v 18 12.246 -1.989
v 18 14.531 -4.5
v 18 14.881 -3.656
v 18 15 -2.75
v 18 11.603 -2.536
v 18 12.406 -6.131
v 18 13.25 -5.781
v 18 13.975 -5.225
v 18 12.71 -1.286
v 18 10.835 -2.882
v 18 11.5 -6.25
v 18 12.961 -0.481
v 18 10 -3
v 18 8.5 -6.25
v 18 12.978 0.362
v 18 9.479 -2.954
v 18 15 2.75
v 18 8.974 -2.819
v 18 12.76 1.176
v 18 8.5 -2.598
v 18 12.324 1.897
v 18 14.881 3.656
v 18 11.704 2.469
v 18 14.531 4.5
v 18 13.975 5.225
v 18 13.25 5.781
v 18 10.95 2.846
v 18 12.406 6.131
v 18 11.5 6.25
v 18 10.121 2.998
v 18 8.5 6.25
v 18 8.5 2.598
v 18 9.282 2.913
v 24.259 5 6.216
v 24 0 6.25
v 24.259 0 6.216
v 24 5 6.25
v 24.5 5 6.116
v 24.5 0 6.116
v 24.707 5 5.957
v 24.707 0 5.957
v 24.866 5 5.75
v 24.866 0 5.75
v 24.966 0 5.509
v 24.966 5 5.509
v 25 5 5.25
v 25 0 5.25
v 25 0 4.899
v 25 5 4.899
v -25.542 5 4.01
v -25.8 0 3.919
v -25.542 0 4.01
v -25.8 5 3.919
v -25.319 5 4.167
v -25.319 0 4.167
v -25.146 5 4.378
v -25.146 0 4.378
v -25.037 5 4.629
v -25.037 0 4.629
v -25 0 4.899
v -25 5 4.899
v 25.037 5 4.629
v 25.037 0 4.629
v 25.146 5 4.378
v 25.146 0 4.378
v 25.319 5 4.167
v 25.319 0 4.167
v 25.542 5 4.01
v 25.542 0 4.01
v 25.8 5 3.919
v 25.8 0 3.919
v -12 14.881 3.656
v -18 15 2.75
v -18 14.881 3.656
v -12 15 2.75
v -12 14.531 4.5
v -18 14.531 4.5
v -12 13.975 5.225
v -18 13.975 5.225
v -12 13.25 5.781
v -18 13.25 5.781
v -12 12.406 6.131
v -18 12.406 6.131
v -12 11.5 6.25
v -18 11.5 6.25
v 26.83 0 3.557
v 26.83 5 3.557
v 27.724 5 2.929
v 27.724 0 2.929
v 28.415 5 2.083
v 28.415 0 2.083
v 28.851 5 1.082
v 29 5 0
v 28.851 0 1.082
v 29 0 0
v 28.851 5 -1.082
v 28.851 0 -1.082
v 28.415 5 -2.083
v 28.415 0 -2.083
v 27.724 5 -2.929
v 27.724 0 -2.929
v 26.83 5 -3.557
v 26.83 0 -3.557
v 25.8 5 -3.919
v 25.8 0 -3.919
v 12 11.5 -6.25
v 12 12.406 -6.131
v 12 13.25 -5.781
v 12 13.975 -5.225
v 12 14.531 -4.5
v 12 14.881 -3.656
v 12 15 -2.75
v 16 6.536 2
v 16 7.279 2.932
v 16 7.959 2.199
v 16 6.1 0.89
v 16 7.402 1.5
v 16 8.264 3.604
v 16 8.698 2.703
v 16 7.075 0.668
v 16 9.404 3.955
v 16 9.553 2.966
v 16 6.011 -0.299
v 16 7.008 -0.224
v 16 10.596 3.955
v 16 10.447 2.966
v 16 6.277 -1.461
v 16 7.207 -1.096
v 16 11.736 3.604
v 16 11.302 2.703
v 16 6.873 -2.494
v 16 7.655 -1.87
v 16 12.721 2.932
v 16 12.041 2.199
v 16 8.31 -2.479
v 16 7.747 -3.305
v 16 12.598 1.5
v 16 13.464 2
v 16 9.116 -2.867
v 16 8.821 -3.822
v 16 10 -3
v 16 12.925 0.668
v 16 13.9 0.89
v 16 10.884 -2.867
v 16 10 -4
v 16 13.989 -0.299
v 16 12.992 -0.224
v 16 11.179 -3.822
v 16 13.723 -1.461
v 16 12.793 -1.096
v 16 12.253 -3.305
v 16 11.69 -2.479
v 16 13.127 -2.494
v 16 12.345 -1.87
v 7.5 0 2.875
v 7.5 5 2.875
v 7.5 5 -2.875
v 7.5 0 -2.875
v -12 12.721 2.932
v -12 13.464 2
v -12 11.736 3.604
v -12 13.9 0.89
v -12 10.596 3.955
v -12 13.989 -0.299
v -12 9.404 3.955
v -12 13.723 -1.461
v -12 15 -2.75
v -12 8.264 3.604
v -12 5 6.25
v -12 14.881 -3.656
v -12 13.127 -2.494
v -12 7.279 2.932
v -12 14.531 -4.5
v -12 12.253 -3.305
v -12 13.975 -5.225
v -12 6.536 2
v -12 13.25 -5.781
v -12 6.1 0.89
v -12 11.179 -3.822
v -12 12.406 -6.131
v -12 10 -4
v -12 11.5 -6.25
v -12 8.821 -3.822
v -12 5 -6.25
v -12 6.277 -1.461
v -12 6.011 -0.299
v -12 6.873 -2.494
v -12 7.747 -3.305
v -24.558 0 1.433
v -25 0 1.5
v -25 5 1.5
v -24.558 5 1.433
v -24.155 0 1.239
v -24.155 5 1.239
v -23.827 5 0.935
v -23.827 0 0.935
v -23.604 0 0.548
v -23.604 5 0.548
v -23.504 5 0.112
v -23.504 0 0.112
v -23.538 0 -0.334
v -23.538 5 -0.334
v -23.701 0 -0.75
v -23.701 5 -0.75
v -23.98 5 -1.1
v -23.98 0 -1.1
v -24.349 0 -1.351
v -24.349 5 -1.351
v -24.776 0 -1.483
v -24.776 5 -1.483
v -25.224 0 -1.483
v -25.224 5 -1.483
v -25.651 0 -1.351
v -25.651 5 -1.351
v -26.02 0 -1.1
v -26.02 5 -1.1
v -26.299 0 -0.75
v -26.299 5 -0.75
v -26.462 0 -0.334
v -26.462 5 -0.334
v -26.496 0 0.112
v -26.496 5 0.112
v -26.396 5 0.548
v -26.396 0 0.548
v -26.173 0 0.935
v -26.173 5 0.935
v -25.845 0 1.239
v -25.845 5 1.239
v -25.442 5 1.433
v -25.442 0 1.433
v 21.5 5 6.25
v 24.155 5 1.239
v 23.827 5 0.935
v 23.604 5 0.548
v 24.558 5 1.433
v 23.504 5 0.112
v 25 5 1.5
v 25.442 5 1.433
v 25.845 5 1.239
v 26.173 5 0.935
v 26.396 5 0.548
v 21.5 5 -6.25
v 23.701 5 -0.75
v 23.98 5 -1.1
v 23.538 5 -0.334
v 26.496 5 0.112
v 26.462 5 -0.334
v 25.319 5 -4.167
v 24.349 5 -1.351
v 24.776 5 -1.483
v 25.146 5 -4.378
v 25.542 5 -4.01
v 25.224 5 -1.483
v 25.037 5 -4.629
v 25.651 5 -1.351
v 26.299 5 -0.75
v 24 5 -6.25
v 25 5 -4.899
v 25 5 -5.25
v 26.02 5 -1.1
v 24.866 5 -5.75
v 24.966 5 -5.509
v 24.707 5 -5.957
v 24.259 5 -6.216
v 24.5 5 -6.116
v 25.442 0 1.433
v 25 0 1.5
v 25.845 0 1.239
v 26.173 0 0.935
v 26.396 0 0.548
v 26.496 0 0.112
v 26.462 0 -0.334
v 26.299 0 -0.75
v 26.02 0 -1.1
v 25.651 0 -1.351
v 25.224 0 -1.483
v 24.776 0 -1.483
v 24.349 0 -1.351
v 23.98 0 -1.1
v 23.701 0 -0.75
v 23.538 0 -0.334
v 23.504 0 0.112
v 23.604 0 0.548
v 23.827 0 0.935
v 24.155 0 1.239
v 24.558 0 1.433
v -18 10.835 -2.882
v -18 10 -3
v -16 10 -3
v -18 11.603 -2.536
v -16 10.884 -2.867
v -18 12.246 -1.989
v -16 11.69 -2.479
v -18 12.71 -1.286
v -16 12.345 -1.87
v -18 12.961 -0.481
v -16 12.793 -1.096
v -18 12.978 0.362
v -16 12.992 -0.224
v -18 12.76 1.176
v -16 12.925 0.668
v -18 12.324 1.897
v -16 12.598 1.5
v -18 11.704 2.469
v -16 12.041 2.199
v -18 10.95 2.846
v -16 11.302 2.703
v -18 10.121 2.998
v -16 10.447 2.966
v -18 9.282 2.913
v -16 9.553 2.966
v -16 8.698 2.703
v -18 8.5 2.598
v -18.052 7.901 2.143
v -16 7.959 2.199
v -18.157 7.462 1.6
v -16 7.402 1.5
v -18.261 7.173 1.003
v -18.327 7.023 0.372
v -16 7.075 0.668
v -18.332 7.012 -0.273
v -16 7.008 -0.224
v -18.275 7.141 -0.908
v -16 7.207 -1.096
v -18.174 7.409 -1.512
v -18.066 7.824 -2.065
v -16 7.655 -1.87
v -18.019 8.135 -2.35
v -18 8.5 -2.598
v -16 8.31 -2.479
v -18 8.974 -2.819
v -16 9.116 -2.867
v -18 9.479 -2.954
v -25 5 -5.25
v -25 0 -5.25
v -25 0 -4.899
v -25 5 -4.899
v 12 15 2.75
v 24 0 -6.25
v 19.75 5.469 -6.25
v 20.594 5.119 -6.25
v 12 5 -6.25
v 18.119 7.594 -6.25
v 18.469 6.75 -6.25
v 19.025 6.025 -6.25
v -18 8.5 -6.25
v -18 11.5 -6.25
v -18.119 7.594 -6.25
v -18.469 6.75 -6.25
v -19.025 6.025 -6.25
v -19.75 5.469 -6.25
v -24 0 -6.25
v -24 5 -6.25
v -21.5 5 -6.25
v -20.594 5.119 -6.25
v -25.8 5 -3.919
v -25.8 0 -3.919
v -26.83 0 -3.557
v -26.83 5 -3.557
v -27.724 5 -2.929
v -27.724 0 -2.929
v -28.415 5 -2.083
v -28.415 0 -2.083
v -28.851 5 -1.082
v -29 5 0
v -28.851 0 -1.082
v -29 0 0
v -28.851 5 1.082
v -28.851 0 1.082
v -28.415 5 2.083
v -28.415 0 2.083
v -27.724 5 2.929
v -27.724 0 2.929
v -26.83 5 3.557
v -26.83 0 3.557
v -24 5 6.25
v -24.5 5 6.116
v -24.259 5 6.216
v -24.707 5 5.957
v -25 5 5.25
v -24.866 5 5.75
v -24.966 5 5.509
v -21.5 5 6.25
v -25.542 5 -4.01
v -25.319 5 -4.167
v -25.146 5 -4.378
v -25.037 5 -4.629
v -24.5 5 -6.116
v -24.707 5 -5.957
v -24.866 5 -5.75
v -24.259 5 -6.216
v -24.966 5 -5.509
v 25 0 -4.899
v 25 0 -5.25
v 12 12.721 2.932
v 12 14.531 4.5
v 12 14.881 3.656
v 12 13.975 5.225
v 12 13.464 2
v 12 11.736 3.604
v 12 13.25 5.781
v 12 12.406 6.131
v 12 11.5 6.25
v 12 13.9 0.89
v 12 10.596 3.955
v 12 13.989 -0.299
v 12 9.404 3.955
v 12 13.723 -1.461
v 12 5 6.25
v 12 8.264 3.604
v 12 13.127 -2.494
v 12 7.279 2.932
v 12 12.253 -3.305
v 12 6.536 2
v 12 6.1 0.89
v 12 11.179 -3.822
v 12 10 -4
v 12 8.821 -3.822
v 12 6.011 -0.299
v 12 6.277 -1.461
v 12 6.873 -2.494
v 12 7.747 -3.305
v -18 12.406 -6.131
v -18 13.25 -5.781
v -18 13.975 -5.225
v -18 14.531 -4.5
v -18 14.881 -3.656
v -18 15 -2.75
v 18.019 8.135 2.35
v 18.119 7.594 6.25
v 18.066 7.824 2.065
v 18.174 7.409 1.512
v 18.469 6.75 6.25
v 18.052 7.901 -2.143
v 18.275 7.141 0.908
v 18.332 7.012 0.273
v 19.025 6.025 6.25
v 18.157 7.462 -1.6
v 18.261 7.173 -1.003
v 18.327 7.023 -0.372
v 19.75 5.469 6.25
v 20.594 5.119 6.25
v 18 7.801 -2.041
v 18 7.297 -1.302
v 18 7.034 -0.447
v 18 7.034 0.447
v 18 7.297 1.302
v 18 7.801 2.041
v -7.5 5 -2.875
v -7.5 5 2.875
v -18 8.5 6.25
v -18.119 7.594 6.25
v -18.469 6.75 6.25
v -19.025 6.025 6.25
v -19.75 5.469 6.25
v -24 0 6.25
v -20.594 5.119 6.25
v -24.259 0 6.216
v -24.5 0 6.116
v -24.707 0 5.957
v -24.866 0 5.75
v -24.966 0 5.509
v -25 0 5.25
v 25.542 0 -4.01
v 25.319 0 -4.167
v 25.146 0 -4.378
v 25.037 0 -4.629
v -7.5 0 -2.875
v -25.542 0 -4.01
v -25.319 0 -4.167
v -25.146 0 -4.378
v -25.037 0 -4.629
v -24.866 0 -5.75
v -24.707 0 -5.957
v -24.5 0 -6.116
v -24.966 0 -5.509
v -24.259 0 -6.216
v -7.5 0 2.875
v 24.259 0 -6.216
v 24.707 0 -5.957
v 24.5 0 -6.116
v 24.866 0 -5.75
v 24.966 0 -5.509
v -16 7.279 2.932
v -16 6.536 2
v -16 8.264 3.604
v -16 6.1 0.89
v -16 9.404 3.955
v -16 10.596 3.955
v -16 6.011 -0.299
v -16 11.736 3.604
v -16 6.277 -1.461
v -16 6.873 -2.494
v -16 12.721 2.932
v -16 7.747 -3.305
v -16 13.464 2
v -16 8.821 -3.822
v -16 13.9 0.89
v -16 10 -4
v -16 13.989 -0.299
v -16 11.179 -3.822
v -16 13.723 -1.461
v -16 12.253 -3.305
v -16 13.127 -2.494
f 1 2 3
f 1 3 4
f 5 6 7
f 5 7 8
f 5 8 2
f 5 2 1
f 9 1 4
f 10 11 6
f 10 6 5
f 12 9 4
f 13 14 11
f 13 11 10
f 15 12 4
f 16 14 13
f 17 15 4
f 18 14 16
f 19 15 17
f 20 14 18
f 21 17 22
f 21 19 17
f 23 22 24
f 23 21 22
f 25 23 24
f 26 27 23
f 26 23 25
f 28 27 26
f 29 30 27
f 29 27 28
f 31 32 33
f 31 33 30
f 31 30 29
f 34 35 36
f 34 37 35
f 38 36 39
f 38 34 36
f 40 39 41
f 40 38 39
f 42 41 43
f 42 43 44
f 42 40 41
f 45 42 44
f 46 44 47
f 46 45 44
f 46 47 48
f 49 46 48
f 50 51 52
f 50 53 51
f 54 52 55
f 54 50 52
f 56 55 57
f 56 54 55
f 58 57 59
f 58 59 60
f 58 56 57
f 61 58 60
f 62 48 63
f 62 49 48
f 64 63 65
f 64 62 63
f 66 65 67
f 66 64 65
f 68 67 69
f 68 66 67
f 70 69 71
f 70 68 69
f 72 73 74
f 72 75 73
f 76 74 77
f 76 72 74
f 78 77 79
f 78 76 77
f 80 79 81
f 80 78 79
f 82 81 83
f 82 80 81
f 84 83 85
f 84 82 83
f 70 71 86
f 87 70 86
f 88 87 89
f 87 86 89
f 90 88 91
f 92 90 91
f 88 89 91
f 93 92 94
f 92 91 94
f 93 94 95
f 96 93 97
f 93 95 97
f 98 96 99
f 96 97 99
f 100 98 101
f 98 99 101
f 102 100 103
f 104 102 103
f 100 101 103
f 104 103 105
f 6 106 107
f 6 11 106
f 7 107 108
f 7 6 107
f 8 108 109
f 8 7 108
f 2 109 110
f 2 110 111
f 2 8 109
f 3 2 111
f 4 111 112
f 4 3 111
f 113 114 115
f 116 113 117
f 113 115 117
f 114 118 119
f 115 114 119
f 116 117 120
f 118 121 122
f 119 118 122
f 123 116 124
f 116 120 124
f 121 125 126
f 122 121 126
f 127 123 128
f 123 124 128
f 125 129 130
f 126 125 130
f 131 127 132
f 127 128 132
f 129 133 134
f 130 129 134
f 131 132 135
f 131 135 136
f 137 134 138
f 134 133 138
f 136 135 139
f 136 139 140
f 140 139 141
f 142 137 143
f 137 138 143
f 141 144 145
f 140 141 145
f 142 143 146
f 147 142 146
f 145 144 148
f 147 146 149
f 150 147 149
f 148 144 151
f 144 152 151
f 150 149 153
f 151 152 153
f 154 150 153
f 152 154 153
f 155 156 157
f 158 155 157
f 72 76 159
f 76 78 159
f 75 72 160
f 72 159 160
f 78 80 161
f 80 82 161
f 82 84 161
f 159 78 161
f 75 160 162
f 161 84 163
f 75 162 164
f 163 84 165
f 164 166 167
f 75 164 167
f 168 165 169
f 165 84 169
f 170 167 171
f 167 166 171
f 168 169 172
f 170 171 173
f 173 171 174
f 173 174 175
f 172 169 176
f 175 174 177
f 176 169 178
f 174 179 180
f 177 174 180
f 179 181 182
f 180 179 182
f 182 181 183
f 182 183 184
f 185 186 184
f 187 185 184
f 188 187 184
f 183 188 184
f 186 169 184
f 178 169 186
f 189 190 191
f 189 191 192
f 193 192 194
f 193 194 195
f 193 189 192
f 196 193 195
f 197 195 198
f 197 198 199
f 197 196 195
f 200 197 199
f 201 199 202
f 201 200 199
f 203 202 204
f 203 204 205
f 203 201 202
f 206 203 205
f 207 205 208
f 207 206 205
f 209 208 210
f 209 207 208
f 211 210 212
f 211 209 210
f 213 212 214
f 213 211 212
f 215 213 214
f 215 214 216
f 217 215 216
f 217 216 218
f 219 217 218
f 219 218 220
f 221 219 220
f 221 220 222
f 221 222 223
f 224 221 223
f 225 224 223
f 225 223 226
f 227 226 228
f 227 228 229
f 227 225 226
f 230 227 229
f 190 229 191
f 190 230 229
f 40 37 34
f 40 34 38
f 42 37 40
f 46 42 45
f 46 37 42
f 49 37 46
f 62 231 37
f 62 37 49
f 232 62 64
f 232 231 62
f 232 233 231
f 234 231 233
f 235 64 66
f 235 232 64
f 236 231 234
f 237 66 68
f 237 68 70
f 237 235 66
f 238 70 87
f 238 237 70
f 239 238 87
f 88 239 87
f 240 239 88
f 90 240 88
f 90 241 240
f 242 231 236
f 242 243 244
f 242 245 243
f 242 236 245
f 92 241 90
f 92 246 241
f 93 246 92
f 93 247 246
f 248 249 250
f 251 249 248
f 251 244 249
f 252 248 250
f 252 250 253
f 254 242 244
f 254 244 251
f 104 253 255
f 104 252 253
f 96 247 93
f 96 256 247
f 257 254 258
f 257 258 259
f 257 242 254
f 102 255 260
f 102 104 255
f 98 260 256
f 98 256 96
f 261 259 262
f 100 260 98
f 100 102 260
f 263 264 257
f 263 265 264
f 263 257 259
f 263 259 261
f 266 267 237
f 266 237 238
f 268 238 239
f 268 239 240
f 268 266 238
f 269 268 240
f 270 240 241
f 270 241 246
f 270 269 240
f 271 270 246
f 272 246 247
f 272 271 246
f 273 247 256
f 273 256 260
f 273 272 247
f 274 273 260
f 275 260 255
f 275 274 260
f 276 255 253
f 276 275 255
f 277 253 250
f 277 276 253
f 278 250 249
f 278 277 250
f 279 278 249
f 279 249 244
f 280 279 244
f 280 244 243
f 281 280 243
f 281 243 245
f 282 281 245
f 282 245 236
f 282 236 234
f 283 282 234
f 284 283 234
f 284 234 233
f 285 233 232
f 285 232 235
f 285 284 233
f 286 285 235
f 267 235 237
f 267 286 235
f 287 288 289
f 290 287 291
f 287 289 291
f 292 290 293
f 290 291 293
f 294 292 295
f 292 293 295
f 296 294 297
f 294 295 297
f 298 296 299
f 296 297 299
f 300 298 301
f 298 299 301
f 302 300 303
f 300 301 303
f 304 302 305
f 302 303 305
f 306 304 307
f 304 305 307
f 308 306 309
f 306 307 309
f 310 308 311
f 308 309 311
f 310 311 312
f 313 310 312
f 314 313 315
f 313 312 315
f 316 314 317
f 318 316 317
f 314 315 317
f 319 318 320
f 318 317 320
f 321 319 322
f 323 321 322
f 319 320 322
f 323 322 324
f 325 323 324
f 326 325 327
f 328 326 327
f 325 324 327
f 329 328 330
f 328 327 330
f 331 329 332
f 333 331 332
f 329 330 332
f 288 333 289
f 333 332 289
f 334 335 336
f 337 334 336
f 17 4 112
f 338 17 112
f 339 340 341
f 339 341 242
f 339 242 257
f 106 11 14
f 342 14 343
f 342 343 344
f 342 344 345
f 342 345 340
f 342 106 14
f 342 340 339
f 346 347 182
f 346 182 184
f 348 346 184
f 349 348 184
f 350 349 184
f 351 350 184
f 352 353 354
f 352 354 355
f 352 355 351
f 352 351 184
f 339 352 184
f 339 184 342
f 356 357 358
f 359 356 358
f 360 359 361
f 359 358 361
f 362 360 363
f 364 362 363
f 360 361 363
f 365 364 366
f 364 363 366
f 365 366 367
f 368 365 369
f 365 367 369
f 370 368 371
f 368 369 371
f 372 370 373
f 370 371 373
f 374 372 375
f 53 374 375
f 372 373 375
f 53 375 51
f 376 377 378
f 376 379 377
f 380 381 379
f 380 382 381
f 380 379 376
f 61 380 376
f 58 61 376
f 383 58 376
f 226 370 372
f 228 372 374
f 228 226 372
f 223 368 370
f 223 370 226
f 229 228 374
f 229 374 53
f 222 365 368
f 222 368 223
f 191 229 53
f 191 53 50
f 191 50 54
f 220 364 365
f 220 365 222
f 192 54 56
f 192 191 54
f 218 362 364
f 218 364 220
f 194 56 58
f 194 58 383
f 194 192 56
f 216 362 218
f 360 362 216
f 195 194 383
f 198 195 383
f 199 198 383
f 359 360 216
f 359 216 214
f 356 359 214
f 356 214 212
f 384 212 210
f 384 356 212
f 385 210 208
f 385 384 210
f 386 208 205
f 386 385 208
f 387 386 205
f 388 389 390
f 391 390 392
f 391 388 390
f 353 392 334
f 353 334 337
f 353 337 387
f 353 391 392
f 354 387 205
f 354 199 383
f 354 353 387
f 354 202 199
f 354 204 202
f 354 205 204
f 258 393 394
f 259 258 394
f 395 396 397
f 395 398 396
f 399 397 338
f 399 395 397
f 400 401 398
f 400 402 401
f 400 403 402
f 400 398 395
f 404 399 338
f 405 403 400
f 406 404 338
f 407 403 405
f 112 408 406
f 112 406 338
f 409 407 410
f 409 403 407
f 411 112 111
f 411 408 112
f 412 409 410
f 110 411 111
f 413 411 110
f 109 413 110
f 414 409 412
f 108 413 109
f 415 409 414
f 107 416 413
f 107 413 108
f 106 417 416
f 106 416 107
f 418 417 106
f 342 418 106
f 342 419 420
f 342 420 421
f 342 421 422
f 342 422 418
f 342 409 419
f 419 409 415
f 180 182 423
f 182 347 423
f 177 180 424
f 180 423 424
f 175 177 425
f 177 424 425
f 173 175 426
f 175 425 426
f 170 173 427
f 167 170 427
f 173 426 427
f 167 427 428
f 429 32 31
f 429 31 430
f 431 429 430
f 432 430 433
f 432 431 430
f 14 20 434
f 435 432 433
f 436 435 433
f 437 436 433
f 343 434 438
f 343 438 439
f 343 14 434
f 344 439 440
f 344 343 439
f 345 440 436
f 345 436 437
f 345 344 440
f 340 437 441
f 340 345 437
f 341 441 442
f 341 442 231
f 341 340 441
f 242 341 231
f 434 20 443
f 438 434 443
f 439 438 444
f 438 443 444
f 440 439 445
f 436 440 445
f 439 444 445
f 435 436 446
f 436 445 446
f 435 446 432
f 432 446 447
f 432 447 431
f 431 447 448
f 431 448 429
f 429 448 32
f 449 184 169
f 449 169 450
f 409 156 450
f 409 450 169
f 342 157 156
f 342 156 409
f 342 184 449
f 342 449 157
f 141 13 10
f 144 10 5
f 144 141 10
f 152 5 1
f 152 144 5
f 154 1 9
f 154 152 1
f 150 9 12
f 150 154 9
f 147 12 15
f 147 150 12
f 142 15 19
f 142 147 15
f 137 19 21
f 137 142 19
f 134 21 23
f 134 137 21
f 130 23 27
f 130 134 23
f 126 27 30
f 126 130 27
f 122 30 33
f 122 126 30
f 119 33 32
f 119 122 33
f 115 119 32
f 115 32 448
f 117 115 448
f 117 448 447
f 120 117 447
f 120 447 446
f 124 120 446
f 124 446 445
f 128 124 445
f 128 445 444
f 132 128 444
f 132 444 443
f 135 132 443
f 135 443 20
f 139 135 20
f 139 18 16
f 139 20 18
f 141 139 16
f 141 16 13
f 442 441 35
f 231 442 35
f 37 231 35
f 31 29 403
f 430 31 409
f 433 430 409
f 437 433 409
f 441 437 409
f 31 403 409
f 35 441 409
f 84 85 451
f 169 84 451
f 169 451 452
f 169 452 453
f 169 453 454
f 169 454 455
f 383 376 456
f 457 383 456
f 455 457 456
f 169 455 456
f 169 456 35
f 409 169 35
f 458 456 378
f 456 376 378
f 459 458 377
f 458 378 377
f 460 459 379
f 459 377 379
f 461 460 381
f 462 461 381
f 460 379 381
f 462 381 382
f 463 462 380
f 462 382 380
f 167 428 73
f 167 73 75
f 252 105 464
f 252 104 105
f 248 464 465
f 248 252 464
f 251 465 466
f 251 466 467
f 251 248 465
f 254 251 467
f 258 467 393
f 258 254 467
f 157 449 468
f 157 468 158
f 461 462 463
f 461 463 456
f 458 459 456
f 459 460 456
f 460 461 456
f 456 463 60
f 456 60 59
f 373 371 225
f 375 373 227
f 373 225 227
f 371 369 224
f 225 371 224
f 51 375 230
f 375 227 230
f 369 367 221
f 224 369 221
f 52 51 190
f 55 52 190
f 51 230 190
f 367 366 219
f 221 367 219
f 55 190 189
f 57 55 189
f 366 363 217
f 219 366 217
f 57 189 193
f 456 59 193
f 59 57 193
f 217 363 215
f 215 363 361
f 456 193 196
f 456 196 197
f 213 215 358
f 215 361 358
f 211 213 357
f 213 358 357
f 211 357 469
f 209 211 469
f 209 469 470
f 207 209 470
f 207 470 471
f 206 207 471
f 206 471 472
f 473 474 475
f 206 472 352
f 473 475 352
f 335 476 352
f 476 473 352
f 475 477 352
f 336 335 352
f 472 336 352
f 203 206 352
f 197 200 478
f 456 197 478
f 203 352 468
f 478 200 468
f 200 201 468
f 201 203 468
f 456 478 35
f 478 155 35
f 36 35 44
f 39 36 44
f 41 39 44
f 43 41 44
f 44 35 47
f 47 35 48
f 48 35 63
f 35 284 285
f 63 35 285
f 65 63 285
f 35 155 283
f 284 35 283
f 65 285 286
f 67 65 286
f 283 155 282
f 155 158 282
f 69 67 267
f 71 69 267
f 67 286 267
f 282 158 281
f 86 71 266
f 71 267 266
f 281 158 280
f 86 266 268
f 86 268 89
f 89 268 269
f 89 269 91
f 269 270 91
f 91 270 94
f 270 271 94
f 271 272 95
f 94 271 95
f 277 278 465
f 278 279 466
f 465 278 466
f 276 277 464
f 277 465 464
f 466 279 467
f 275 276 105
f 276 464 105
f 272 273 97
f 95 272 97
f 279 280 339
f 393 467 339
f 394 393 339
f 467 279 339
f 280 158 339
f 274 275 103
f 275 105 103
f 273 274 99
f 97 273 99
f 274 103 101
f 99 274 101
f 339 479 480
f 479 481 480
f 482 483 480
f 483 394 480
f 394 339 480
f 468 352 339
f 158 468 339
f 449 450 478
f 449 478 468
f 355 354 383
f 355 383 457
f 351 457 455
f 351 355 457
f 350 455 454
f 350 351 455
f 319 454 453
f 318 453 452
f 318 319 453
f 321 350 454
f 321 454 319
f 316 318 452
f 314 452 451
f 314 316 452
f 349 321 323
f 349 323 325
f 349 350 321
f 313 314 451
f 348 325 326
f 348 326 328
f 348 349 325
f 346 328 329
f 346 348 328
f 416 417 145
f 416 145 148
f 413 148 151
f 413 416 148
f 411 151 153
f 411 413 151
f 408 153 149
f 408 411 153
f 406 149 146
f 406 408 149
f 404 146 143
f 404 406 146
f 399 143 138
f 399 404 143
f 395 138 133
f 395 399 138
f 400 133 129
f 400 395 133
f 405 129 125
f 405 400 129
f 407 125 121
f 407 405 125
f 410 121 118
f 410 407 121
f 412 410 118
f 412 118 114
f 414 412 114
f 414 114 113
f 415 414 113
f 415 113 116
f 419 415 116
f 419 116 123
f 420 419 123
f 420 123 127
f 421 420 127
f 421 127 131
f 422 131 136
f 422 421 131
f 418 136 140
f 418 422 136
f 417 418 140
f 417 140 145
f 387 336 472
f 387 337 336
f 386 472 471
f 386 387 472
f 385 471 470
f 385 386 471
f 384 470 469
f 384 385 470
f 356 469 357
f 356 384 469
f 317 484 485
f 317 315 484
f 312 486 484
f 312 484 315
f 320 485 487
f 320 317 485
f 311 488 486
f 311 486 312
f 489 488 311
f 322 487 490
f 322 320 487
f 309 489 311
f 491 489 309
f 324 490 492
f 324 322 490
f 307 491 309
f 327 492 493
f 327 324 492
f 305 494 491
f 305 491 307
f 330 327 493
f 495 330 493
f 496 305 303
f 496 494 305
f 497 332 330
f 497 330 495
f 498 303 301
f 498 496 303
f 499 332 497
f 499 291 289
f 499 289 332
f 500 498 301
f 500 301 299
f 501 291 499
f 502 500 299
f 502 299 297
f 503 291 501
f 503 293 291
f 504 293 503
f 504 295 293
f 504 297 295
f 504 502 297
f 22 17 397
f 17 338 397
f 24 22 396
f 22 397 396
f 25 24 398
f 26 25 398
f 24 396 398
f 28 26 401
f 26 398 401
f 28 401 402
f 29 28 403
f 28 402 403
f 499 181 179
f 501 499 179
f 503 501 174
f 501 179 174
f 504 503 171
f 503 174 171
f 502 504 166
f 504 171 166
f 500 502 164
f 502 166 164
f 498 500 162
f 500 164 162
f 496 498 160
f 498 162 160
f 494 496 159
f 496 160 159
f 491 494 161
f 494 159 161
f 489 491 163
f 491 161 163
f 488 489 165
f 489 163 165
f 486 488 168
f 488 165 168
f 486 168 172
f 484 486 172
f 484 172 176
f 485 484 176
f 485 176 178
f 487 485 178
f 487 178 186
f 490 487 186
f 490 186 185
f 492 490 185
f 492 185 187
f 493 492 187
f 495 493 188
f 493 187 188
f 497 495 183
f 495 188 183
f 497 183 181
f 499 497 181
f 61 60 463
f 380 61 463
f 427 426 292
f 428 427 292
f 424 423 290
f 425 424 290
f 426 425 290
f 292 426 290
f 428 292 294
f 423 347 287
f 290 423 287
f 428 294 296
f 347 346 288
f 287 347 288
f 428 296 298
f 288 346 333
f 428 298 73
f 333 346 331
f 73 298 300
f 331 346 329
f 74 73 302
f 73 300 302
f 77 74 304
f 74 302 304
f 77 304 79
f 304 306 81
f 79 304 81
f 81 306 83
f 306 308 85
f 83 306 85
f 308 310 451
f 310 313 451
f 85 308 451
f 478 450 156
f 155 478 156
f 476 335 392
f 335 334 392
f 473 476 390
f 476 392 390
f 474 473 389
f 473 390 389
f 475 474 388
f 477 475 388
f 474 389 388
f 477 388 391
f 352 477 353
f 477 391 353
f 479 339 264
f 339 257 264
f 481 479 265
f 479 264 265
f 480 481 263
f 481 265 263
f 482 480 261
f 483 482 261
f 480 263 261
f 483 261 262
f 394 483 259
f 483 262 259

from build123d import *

# Parameters (mm, degrees)
SKETCH1_R           = 1.5
BOSS_EXTRUDE1_DEPTH = 5
BOSS_EXTRUDE2_DEPTH = 10
SKETCH3_R           = 4
CUT_EXTRUDE1_DEPTH  = 4
SKETCH3_3_R         = 3
CUT_EXTRUDE2_DEPTH  = 45.102862719
FILLET6_R           = 3.5
FILLET7_R           = 3.5
FILLET8_R           = 3.5
FILLET9_R           = 3.5
FILLET10_R          = 3.5
FILLET11_R          = 3.5
FILLET12_R          = 1
FILLET13_R          = 1
FILLET14_R          = 1
FILLET15_R          = 1
FILLET16_R          = 1
FILLET17_R          = 1
FILLET18_R          = 1
FILLET19_R          = 1
SKETCH4_W           = 15
SKETCH4_H           = 5.75
CUT_EXTRUDE3_DEPTH  = 32.305949934


with BuildPart() as part:
    # Sketch1 → Boss-Extrude1 (new body)
    with BuildSketch(Plane(origin=(0, 0, 0), x_dir=(1, 0, 0), z_dir=(0, 1, 0))):
        with BuildLine():
            Line((-25, -4), (-25, -6.25))
            Line((-25, -6.25), (25, -6.25))
            Line((25, -6.25), (25, -4))
            ThreePointArc((25, -4), (29, 0), (25, 4))
            Line((25, 4), (25, 6.25))
            Line((25, 6.25), (-25, 6.25))
            Line((-25, 6.25), (-25, 4))
            ThreePointArc((-25, 4), (-29, 0), (-25, -4))
        make_face()
        with Locations(Location((25, 0, 0), (0, 0, 270))):
            Circle(SKETCH1_R, mode=Mode.SUBTRACT)
        with Locations(Location((-25, 0, 0), (0, 0, 270))):
            Circle(SKETCH1_R, mode=Mode.SUBTRACT)
    extrude(amount=BOSS_EXTRUDE1_DEPTH)

    # Sketch2 → Boss-Extrude2 (add)
    with BuildSketch(Plane(origin=(0, 5, 0), x_dir=(1, 0, 0), z_dir=(0, 1, 0))):
        Polygon((-18, 0), (-18, -6.25), (-12, -6.25), (-12, 6.25), (-18, 6.25), align=None)
    boss_extrude2 = extrude(amount=BOSS_EXTRUDE2_DEPTH)

    # Sketch3 → Cut-Extrude1 (cut)
    with BuildSketch(Plane(origin=(-12, 0, 0), x_dir=(0, 0, -1), z_dir=(1, 0, 0))):
        with Locations((0, 10)):
            Circle(SKETCH3_R)
    cut_extrude1 = extrude(amount=-CUT_EXTRUDE1_DEPTH, mode=Mode.SUBTRACT)

    # Sketch3<3> → Cut-Extrude2 (cut, through all)
    with BuildSketch(Plane(origin=(-12, 0, 0), x_dir=(0, 0, -1), z_dir=(1, 0, 0))):
        with Locations((0, 10)):
            Circle(SKETCH3_3_R)
    cut_extrude2 = extrude(amount=-CUT_EXTRUDE2_DEPTH, mode=Mode.SUBTRACT)

    # Fillet6
    # the kernel refuses this fillet: 3.5 mm, written as the material it adds along each edge
    with BuildSketch(Plane(origin=(-18, 5, -6.25), x_dir=(0, 1, 0), z_dir=(0, 0, 1))) as fillet6_piece_1_section:
        with BuildLine():
            CenterArc((FILLET6_R, FILLET6_R), FILLET6_R, 180, 90)
            Line((0, FILLET6_R), (0, 0))
            Line((0, 0), (FILLET6_R, 0))
        make_face()
    fillet6_piece_1 = extrude(amount=12.5, mode=Mode.PRIVATE)
    fillet6_piece_1 = fillet6_piece_1 - Plane(origin=(-18.808785758, 10, 0), x_dir=(0, 0, -1), z_dir=(1, 0, 0)) * Cylinder(3, 39, mode=Mode.PRIVATE)
    add(fillet6_piece_1)

    # Fillet7
    fillet7_edges = [part.edges().sort_by_distance(p)[0] for p in [
        (-15, 15, -6.25),
    ]]
    fillet(fillet7_edges, radius=FILLET7_R)

    # Fillet8
    fillet8_edges = [part.edges().sort_by_distance(p)[0] for p in [
        (-15, 15, 6.25),
    ]]
    fillet(fillet8_edges, radius=FILLET8_R)

    # Mirror4: Boss-Extrude2, Cut-Extrude1, Cut-Extrude2 across plane
    add(boss_extrude2.mirror(Plane(origin=(0, 0, 0), x_dir=(0, 0, 1), z_dir=(1, 0, 0))))
    add(cut_extrude1.mirror(Plane(origin=(0, 0, 0), x_dir=(0, 0, 1), z_dir=(1, 0, 0))), mode=Mode.SUBTRACT)
    add(cut_extrude2.mirror(Plane(origin=(0, 0, 0), x_dir=(0, 0, 1), z_dir=(1, 0, 0))), mode=Mode.SUBTRACT)

    # Fillet9
    fillet9_edges = [part.edges().sort_by_distance(p)[0] for p in [
        (15, 15, -6.25),
    ]]
    fillet(fillet9_edges, radius=FILLET9_R)

    # Fillet10
    fillet10_edges = [part.edges().sort_by_distance(p)[0] for p in [
        (15, 15, 6.25),
    ]]
    fillet(fillet10_edges, radius=FILLET10_R)

    # Fillet11
    # the kernel refuses this fillet: 3.5 mm, written as the material it adds along each edge
    with BuildSketch(Plane(origin=(18, 5, -6.25), x_dir=(0, 1, 0), z_dir=(0, 0, 1))) as fillet11_piece_1_section:
        with BuildLine():
            CenterArc((FILLET11_R, -FILLET11_R), FILLET11_R, 90, 90)
            Line((0, -FILLET11_R), (0, 0))
            Line((0, 0), (FILLET11_R, 0))
        make_face()
    fillet11_piece_1 = extrude(amount=12.5, mode=Mode.PRIVATE)
    fillet11_piece_1 = fillet11_piece_1 - Plane(origin=(18.808785758, 10, 0), x_dir=(0, 0, -1), z_dir=(-1, 0, 0)) * Cylinder(3, 39, mode=Mode.PRIVATE)
    add(fillet11_piece_1)

    # Fillet12
    fillet12_edges = [part.edges().sort_by_distance(p)[0] for p in [
        (25, 2.5, -6.25),
    ]]
    fillet(fillet12_edges, radius=FILLET12_R)

    # Fillet13
    fillet13_edges = [part.edges().sort_by_distance(p)[0] for p in [
        (25, 2.5, 6.25),
    ]]
    fillet(fillet13_edges, radius=FILLET13_R)

    # Fillet14
    fillet14_edges = [part.edges().sort_by_distance(p)[0] for p in [
        (-25, 2.5, 6.25),
    ]]
    fillet(fillet14_edges, radius=FILLET14_R)

    # Fillet15
    fillet15_edges = [part.edges().sort_by_distance(p)[0] for p in [
        (-25, 2.5, -6.25),
    ]]
    fillet(fillet15_edges, radius=FILLET15_R)

    # Fillet16
    fillet16_edges = [part.edges().sort_by_distance(p)[0] for p in [
        (-25, 2.5, -4),
    ]]
    fillet(fillet16_edges, radius=FILLET16_R)

    # Fillet17
    fillet17_edges = [part.edges().sort_by_distance(p)[0] for p in [
        (-25, 2.5, 4),
    ]]
    fillet(fillet17_edges, radius=FILLET17_R)

    # Fillet18
    fillet18_edges = [part.edges().sort_by_distance(p)[0] for p in [
        (25, 2.5, 4),
    ]]
    fillet(fillet18_edges, radius=FILLET18_R)

    # Fillet19
    fillet19_edges = [part.edges().sort_by_distance(p)[0] for p in [
        (25, 2.5, -4),
    ]]
    fillet(fillet19_edges, radius=FILLET19_R)

    # Sketch4 → Cut-Extrude3 (cut, through all)
    with BuildSketch(Plane(origin=(0, 5, 0), x_dir=(1, 0, 0), z_dir=(0, 1, 0))):
        Rectangle(SKETCH4_W, SKETCH4_H)
    extrude(amount=-CUT_EXTRUDE3_DEPTH, mode=Mode.SUBTRACT)


solid = part.part
